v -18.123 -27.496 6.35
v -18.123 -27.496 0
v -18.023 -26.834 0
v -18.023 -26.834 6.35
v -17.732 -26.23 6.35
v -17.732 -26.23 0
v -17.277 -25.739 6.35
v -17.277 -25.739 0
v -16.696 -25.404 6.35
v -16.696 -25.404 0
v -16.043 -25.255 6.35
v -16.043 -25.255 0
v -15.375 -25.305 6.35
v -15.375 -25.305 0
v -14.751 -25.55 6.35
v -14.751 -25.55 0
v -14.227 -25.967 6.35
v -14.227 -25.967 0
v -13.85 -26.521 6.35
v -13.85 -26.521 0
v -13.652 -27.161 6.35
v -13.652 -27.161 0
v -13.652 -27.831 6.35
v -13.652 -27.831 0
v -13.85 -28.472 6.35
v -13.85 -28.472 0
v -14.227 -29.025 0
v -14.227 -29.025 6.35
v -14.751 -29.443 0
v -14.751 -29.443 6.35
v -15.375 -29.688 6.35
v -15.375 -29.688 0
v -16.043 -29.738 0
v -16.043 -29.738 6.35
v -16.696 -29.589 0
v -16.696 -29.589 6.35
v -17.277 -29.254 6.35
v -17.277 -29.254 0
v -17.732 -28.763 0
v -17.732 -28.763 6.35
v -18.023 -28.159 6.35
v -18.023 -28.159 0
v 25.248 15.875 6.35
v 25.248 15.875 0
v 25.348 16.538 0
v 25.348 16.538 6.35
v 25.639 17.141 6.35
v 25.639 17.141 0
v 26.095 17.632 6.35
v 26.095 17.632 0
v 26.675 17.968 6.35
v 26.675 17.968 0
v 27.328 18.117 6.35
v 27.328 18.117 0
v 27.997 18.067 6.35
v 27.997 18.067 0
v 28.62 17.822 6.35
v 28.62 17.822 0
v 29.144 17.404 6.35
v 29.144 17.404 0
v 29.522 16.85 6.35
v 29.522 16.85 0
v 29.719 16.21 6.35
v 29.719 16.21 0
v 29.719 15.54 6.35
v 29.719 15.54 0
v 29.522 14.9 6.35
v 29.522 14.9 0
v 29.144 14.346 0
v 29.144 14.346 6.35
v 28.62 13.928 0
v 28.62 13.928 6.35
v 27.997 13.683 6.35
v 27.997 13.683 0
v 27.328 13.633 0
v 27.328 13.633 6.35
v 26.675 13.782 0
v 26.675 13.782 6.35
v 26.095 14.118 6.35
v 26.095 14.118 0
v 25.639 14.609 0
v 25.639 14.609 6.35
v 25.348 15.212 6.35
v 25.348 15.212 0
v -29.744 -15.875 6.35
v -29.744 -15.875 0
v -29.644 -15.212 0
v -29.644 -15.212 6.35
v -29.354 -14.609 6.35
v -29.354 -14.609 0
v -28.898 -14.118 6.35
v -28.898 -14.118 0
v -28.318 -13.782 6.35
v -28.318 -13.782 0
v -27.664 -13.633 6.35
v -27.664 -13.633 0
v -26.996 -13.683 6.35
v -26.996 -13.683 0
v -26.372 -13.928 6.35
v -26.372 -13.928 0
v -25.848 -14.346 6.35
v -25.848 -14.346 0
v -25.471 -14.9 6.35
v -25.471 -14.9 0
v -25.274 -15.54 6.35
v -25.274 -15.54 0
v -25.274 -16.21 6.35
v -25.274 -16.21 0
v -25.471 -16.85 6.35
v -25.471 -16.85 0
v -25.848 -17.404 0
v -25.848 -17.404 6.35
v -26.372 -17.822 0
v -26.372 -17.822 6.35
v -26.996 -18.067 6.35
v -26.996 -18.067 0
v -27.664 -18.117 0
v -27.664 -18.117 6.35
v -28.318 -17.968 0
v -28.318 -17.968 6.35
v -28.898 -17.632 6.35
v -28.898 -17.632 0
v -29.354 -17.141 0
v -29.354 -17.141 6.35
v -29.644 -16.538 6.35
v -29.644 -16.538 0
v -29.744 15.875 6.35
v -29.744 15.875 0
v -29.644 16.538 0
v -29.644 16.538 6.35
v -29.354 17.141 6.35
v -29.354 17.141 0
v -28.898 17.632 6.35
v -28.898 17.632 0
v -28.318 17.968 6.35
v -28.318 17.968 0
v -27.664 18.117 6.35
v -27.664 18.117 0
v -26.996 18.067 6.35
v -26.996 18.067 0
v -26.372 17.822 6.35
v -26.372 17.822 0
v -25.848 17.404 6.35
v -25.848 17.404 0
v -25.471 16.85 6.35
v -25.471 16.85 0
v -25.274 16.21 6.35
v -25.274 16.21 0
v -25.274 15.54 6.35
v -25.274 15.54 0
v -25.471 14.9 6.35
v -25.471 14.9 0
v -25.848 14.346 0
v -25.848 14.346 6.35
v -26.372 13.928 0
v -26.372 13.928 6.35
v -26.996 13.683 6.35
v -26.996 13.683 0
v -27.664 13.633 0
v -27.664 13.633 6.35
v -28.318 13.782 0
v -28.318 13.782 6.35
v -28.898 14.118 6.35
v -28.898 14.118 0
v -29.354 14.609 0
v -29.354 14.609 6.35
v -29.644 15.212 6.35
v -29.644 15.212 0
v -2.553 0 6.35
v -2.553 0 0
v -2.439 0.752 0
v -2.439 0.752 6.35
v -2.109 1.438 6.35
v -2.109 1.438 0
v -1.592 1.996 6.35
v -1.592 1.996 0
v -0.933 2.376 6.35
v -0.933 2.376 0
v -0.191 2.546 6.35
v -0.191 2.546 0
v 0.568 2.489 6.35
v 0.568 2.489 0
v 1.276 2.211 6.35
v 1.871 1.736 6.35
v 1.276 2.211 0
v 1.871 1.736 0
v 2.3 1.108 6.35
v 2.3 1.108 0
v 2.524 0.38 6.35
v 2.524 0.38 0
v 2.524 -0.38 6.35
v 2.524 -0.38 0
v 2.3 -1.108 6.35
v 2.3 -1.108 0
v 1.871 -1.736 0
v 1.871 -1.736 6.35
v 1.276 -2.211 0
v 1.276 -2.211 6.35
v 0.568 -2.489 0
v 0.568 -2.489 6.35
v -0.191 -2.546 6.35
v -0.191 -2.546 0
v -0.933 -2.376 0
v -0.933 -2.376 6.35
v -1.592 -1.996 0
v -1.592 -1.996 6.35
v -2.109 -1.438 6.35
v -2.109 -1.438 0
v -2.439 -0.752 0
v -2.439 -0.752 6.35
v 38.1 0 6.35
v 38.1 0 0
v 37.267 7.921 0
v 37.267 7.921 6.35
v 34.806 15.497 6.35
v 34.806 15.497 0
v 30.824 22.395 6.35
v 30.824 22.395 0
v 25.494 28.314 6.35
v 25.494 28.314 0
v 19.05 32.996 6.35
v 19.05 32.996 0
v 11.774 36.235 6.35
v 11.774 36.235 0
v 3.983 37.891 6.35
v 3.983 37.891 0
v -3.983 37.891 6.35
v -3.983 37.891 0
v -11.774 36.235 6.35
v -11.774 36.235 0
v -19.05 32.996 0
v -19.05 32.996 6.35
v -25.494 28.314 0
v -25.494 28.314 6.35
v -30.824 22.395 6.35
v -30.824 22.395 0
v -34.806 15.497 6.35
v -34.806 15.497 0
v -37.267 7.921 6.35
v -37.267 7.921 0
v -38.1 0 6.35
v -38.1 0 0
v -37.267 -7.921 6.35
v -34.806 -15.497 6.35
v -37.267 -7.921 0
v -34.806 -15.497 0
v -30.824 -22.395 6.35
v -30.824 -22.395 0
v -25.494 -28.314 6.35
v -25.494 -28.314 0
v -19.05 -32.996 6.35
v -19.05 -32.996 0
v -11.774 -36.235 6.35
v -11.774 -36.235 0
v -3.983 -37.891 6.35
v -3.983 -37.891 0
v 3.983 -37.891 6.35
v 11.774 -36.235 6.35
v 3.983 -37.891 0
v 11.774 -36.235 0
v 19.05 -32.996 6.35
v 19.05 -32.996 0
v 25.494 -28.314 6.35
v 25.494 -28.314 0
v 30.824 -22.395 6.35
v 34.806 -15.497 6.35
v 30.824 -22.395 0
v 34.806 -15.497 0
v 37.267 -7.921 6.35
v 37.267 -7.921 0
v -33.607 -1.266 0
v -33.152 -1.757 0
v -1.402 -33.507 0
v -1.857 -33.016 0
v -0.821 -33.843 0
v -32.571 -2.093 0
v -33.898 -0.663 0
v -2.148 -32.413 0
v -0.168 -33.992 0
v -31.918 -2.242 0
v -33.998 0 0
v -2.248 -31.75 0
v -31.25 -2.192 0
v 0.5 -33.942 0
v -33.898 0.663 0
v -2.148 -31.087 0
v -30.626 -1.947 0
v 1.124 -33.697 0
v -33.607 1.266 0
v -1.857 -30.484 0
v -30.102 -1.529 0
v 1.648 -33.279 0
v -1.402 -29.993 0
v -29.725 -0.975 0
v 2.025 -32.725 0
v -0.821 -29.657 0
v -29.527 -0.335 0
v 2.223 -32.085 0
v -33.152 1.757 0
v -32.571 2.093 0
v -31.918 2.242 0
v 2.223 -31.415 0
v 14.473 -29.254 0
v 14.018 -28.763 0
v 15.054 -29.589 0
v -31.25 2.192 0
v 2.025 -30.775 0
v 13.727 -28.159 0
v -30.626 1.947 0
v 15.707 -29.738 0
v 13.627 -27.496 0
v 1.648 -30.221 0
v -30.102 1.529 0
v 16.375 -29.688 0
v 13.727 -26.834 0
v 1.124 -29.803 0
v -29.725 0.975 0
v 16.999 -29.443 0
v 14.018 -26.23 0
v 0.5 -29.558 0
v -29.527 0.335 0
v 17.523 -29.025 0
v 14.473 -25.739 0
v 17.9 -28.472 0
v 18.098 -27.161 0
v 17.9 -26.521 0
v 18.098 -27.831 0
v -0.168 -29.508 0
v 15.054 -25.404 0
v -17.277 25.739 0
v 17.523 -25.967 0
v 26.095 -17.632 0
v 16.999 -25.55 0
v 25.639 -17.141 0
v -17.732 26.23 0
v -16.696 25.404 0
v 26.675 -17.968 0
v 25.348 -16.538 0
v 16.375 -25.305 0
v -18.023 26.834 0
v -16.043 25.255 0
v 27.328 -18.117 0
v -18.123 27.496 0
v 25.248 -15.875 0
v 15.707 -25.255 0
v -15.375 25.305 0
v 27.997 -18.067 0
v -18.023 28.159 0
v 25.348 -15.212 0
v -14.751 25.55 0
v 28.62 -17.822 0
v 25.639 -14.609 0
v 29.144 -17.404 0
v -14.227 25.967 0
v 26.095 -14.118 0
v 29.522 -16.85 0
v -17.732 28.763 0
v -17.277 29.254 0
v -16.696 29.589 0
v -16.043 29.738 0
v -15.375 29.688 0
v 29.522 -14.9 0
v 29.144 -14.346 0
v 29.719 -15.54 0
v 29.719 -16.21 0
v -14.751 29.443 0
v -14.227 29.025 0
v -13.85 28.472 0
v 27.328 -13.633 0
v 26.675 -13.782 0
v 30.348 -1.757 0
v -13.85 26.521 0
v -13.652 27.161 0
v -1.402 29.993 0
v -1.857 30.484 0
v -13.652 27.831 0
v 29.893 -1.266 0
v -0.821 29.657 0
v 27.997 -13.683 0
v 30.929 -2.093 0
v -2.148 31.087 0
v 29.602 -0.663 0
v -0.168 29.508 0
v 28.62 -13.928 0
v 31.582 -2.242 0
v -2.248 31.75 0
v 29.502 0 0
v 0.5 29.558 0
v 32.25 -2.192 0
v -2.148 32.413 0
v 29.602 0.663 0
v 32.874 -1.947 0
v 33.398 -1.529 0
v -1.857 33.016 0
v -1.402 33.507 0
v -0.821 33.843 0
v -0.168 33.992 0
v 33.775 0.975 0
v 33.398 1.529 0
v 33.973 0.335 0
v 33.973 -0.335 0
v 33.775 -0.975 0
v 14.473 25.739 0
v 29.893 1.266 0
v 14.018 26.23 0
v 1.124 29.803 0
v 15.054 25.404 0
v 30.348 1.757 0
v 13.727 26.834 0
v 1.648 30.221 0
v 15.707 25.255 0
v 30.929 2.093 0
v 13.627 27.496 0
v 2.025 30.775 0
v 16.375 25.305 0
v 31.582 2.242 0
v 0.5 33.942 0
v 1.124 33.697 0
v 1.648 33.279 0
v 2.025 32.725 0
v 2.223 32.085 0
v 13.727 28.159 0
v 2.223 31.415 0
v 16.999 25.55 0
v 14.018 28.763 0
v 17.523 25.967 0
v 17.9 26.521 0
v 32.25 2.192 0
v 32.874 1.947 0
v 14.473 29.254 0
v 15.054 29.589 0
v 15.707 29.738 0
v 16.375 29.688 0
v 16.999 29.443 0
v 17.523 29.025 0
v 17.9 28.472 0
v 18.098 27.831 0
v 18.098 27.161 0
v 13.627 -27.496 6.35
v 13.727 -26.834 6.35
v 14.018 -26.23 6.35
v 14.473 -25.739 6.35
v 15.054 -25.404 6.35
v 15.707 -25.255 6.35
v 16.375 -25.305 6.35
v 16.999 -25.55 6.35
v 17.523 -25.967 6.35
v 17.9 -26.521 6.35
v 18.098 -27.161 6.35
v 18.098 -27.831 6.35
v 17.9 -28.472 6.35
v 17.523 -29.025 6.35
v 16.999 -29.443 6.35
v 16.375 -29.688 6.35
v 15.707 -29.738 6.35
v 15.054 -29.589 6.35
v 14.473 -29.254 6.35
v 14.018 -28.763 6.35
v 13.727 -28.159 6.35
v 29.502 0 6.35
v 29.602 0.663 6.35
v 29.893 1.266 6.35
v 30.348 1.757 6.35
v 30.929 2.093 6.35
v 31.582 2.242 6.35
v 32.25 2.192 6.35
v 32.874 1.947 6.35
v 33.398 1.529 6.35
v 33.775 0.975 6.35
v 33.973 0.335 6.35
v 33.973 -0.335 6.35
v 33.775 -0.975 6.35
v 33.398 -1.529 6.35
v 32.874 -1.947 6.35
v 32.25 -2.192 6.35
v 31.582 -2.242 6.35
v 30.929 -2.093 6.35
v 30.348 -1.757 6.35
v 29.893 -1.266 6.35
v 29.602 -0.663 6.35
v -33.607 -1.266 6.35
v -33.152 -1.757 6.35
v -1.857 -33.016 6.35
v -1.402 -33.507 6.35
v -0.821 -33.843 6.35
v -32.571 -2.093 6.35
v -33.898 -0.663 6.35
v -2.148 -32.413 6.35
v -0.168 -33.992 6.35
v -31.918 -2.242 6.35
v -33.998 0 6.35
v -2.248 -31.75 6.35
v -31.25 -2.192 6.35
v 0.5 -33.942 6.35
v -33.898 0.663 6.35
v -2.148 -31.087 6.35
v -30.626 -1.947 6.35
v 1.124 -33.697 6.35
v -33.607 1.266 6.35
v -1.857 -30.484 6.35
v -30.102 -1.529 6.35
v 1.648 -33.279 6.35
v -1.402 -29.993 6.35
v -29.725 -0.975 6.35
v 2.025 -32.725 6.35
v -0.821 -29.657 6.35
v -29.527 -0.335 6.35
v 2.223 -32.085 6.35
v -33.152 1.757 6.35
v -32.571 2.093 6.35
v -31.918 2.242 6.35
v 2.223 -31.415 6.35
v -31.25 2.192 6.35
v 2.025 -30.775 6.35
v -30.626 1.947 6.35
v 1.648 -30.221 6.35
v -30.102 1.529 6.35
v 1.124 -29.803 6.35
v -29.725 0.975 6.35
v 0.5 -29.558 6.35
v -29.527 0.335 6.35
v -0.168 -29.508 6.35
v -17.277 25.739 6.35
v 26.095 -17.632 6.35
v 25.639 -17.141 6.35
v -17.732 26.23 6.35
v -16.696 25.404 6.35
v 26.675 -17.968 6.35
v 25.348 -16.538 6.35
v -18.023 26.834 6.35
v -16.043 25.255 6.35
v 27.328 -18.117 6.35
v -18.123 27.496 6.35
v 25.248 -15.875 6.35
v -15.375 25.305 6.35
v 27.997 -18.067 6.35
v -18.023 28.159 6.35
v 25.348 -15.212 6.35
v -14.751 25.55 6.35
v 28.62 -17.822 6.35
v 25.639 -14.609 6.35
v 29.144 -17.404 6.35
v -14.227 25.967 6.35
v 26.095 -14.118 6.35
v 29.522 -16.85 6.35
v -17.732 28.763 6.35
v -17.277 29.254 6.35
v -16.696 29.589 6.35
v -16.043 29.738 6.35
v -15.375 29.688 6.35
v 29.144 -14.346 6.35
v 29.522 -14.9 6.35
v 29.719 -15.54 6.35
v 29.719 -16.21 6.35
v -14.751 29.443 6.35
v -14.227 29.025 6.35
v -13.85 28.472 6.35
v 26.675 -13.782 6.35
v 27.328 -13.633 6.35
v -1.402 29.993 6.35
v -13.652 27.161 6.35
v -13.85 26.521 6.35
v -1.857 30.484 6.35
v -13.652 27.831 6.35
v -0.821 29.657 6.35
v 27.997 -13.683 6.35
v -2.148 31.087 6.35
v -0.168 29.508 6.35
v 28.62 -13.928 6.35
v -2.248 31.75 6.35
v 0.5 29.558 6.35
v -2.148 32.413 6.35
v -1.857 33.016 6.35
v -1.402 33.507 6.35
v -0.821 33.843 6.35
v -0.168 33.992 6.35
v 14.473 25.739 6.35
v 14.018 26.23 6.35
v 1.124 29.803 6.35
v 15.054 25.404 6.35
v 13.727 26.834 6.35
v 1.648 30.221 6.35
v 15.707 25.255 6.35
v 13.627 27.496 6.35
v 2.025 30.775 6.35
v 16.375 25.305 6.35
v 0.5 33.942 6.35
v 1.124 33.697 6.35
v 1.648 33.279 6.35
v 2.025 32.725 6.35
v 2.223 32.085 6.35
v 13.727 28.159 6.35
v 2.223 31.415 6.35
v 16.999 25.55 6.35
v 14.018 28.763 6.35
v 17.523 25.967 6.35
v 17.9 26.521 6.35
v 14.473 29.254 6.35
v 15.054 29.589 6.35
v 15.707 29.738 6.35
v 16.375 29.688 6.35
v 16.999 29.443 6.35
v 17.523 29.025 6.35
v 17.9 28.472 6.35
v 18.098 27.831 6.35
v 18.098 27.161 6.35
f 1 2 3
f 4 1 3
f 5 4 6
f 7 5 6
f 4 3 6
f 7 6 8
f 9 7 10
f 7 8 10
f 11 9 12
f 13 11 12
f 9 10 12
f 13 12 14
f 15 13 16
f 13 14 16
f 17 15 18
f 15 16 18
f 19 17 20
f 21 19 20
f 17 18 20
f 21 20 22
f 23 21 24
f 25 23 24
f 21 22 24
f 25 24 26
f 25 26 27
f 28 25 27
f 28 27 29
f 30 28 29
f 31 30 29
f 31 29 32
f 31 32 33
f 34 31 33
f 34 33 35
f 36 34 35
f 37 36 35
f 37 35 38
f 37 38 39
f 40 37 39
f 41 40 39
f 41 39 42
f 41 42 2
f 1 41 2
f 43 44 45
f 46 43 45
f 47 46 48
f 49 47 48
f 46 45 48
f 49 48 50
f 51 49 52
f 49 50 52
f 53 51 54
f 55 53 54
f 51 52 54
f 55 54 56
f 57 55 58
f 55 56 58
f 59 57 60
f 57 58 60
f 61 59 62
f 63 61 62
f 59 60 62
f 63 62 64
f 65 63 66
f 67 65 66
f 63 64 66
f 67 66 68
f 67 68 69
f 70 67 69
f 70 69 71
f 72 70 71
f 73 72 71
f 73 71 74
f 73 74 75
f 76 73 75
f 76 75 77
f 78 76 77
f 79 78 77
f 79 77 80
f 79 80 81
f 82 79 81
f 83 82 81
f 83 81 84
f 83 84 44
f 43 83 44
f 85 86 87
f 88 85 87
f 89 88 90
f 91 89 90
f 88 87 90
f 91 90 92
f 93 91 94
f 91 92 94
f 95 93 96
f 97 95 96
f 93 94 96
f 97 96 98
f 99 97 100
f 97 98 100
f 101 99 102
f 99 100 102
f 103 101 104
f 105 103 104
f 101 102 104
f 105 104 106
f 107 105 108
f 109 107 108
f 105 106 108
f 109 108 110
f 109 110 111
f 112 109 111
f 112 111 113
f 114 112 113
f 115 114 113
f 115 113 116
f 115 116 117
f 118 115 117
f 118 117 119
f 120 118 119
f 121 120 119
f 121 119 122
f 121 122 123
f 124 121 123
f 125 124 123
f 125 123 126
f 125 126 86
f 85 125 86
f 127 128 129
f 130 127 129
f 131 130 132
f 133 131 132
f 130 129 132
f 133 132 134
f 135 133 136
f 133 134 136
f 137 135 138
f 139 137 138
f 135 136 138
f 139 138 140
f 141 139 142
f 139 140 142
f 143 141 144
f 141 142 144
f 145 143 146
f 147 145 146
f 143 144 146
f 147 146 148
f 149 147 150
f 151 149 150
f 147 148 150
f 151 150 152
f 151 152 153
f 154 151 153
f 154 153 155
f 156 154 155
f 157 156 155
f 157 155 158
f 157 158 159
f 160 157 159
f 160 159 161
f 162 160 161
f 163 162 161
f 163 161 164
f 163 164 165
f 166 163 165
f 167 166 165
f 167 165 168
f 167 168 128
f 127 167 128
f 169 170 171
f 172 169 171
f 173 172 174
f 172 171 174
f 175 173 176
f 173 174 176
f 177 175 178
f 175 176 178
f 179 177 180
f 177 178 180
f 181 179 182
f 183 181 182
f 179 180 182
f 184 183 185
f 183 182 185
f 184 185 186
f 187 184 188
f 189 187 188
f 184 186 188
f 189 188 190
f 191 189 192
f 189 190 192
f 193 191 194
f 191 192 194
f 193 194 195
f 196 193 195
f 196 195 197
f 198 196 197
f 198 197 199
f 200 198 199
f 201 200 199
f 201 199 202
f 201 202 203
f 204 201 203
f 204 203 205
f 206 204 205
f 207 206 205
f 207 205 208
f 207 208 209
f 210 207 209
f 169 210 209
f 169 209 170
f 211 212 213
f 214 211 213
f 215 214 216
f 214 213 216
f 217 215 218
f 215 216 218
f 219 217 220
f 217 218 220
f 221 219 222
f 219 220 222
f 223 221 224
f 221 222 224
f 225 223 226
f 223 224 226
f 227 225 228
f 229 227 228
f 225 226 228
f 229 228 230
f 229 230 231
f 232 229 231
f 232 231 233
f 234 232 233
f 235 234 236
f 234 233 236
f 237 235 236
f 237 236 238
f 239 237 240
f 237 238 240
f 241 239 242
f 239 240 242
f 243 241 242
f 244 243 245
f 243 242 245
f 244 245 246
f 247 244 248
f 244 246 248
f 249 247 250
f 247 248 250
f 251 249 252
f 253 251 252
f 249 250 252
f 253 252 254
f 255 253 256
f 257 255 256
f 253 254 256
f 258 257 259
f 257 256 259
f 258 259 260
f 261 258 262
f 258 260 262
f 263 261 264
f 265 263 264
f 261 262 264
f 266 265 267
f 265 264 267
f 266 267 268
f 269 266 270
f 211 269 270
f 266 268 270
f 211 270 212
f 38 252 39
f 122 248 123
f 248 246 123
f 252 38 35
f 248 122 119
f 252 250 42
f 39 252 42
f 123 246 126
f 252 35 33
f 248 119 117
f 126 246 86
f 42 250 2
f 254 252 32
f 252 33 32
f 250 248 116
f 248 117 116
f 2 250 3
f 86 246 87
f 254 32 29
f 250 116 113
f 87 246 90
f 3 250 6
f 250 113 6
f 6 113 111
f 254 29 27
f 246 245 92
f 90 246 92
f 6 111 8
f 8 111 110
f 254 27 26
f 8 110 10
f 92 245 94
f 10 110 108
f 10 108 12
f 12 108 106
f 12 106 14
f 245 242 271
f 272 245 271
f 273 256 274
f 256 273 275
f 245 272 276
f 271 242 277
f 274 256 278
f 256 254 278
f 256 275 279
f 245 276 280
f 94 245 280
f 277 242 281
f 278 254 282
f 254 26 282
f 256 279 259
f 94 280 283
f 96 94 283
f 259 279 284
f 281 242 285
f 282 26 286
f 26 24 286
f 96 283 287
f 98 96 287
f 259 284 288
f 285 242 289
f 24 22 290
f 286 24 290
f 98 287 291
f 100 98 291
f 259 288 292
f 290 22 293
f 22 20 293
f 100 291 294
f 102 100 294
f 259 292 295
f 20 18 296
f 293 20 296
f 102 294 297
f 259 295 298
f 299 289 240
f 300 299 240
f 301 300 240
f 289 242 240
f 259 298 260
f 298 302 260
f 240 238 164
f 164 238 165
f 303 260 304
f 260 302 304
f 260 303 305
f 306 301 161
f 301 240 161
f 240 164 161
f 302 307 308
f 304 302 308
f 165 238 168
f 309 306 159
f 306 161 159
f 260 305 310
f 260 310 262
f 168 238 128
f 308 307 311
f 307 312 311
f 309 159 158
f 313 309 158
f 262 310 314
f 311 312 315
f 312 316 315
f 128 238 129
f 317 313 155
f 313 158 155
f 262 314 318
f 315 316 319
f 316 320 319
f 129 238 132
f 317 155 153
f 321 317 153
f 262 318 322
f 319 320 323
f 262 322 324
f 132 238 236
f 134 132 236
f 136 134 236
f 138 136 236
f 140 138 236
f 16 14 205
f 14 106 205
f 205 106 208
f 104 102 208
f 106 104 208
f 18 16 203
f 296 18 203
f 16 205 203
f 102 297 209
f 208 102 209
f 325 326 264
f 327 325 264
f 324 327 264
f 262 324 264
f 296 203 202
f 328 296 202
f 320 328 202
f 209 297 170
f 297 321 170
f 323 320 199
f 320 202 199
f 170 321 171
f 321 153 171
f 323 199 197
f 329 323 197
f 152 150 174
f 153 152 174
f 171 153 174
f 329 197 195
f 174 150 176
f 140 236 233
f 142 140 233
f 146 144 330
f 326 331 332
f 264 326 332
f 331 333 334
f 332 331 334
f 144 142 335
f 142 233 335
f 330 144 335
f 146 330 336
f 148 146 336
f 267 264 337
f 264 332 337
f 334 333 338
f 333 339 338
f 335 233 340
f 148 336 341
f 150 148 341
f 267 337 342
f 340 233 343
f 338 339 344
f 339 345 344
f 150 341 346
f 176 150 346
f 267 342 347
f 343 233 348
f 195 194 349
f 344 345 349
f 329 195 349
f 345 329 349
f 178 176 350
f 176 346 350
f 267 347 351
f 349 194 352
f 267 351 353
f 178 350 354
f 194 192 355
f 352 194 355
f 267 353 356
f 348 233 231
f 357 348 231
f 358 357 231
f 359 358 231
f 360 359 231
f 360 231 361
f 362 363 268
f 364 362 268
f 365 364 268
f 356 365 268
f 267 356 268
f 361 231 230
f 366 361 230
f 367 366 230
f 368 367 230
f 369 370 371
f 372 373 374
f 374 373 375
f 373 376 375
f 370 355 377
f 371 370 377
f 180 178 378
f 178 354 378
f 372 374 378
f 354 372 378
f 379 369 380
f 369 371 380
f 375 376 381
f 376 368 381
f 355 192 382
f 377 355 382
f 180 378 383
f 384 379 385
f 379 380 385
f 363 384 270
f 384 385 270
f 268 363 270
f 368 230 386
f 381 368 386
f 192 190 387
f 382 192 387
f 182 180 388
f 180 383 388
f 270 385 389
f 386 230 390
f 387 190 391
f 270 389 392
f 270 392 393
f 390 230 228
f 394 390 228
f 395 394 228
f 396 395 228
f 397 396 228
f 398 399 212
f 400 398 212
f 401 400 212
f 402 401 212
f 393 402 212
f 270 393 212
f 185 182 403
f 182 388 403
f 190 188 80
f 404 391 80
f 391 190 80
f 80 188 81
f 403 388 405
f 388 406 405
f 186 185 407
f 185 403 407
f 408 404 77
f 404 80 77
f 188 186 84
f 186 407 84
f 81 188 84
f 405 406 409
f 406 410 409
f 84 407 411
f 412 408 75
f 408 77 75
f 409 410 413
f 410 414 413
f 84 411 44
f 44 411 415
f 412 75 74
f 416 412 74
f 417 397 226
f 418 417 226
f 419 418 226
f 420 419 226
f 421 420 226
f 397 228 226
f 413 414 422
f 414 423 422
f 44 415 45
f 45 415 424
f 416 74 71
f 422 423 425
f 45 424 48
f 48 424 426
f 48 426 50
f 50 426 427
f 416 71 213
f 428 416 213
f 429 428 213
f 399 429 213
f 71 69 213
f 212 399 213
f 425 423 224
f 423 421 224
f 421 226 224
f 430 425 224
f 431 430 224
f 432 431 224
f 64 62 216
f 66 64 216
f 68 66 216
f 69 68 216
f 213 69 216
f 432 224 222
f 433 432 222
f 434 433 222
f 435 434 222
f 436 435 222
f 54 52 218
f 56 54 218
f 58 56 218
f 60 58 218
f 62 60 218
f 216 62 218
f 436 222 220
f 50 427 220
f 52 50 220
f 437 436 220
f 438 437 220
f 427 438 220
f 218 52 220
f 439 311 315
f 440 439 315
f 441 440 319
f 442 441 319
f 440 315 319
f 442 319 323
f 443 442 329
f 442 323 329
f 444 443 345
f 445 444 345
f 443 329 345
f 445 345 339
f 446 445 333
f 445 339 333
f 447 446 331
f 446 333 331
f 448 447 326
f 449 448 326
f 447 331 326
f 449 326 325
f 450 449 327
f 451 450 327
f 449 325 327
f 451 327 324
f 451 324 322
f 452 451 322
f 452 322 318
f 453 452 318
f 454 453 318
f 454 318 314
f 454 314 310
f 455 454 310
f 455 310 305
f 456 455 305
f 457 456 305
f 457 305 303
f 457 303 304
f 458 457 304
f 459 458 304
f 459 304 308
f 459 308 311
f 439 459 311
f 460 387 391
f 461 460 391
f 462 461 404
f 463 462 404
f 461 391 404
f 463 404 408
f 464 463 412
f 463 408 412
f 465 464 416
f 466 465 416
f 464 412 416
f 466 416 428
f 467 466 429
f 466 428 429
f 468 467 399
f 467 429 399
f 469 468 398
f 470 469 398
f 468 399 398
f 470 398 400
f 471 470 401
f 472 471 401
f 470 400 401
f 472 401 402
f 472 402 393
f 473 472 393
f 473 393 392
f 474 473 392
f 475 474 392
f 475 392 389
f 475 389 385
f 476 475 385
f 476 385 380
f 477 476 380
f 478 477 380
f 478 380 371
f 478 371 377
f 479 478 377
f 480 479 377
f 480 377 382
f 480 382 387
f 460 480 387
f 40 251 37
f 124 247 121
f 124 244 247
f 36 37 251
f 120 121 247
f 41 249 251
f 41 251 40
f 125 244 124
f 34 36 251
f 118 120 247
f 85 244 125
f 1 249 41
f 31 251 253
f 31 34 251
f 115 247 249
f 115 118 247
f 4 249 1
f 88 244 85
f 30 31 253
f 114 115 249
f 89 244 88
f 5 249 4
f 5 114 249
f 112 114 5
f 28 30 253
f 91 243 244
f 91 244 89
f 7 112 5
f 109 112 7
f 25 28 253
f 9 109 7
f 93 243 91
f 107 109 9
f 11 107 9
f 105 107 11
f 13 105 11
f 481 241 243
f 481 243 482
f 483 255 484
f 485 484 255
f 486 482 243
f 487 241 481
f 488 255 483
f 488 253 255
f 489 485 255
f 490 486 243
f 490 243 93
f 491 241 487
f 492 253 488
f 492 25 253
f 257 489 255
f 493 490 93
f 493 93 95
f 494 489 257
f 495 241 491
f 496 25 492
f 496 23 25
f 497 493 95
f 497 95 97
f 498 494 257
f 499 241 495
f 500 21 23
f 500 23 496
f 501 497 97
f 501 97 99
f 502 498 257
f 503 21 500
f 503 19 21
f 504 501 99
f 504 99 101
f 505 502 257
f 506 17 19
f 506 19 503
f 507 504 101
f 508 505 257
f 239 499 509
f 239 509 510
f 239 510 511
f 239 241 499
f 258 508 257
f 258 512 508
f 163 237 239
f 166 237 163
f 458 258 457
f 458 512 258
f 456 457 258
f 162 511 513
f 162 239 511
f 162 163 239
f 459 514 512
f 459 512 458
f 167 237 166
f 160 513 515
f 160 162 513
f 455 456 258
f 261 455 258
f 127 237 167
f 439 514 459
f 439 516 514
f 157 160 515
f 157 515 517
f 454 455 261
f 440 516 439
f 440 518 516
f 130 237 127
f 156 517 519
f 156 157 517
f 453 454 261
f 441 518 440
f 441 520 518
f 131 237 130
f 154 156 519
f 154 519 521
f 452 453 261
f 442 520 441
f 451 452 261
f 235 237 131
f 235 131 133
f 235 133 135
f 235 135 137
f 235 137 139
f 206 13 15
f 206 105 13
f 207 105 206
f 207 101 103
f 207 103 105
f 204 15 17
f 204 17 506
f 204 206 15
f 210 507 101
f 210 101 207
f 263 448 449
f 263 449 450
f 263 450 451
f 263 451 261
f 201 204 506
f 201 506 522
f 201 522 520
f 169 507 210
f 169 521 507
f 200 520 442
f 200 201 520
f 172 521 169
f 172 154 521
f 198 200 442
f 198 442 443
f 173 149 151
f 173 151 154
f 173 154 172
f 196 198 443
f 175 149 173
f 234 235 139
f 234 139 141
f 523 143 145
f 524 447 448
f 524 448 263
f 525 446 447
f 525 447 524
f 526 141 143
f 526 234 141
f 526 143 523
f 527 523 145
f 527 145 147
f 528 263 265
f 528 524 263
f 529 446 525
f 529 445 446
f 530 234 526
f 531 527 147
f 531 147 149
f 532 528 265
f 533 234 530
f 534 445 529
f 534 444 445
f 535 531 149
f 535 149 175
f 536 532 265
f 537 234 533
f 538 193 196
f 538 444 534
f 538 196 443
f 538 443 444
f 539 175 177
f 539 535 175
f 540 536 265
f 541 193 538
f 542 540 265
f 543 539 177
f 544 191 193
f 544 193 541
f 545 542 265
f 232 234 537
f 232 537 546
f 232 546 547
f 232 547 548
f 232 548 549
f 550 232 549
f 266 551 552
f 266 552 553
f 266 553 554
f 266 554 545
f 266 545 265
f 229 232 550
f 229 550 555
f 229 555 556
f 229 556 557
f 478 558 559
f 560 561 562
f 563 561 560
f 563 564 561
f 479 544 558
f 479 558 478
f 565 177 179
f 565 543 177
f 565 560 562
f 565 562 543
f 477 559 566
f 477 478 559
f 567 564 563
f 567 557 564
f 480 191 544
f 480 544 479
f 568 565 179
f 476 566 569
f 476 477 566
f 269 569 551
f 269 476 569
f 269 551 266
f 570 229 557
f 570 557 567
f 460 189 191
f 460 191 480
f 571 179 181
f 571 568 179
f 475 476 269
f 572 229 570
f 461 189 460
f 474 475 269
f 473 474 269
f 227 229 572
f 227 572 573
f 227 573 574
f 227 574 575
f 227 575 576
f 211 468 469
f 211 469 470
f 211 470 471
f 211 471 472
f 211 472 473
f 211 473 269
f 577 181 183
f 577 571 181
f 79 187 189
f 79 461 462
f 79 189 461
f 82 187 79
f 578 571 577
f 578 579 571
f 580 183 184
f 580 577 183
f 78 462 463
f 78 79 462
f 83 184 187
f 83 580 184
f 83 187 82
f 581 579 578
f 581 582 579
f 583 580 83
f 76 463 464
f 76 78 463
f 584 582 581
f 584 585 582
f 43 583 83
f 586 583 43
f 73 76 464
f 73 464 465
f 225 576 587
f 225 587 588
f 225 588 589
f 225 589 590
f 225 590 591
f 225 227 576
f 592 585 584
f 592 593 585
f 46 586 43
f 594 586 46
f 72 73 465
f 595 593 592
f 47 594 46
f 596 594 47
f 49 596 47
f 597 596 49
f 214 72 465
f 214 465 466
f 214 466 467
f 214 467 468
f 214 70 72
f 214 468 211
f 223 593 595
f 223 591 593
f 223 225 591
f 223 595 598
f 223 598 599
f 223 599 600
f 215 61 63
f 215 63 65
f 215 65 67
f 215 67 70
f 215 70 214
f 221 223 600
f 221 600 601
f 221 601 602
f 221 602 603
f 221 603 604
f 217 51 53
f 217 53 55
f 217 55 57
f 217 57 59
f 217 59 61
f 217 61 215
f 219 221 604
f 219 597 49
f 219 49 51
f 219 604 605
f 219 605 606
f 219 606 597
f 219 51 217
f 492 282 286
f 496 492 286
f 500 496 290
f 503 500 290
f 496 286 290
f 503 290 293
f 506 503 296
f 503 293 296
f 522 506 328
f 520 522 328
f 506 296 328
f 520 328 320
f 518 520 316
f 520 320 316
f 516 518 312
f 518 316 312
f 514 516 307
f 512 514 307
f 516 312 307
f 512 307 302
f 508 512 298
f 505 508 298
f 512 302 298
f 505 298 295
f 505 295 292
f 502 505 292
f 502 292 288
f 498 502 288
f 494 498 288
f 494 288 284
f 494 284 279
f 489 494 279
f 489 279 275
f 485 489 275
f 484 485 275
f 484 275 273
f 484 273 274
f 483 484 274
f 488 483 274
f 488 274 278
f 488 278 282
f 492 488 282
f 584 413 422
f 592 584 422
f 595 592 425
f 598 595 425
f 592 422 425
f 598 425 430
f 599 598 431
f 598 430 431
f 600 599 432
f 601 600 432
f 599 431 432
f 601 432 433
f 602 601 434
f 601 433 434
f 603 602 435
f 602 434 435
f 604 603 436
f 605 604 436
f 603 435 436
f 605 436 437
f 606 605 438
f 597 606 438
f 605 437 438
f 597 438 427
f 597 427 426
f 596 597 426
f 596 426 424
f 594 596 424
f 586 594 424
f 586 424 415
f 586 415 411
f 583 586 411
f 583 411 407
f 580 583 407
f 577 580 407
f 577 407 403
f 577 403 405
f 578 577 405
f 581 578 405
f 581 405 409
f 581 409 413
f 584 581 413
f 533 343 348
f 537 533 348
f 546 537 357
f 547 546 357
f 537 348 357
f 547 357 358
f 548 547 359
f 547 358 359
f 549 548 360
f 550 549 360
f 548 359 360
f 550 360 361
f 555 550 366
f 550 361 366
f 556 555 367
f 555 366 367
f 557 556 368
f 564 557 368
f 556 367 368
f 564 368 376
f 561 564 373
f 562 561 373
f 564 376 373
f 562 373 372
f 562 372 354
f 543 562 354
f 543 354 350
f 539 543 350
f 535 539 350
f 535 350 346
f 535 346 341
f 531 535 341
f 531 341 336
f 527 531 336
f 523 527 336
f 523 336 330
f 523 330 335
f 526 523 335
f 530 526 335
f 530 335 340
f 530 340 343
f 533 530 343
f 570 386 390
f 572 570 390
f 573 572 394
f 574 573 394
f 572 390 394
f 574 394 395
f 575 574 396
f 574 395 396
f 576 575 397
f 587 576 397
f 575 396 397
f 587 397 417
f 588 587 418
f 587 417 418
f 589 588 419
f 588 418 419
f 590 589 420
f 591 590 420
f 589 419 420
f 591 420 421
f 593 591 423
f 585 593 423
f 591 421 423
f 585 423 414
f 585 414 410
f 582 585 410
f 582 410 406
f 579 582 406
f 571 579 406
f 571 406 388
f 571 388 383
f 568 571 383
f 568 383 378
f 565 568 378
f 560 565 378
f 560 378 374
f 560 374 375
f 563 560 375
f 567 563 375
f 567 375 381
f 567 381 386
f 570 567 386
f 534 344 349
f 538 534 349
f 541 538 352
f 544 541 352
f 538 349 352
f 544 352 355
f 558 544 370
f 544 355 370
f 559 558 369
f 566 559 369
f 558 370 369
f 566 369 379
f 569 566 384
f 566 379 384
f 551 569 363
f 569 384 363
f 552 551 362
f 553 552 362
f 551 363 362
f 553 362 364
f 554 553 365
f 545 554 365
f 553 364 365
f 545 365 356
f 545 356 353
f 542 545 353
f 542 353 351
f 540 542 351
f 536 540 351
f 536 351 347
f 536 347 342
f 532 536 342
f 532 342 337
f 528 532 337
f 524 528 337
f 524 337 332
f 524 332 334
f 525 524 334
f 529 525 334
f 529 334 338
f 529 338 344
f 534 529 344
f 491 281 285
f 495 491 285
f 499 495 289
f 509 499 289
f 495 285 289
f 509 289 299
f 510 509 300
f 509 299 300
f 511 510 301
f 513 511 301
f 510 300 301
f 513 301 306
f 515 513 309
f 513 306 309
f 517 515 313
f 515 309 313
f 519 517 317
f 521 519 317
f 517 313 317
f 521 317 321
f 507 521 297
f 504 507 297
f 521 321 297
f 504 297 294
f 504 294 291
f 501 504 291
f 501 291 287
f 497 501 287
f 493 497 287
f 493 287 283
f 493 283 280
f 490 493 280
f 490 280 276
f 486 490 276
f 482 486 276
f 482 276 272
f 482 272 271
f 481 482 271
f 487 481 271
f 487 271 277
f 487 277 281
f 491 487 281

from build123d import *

# Parameters (mm, degrees)
SKETCH1_R                 = 38.1
BOSS_EXTRUDE1_DEPTH       = 6.35
F_1_4_20_TAPPED_HOLE1_D   = 5.1054
F_8_CLEARANCE_HOLE1_D     = 4.4958
F_8_CLEARANCE_HOLE1_DEPTH = 313.436
F_8_CLEARANCE_HOLE1_TIP   = 1.350674586


with BuildPart() as part:
    # Sketch1 → Boss-Extrude1 (new body)
    with BuildSketch(Plane.XY):
        Circle(SKETCH1_R)
    extrude(amount=BOSS_EXTRUDE1_DEPTH)

    # 1/4-20 Tapped Hole1 (through all)
    with Locations(Plane.XY.offset(6.35)):
        with Locations((0, 0)):
            Hole(F_1_4_20_TAPPED_HOLE1_D / 2)

    # #8 Clearance Hole1
    with Locations(Plane.XY.offset(6.35)):
        with Locations((-31.75, 0), (-27.49630657, 15.875), (-15.875, 27.49630657), (0, 31.75), (15.875, 27.49630657), (27.49630657, 15.875), (31.75, 0), (27.49630657, -15.875), (15.875, -27.49630657), (0, -31.75), (-15.875, -27.49630657), (-27.49630657, -15.875)):
            Hole(F_8_CLEARANCE_HOLE1_D / 2, depth=F_8_CLEARANCE_HOLE1_DEPTH)
            with Locations((0, 0, -(F_8_CLEARANCE_HOLE1_DEPTH + F_8_CLEARANCE_HOLE1_TIP / 2))):  # 118° drill point
                Cone(0, F_8_CLEARANCE_HOLE1_D / 2, F_8_CLEARANCE_HOLE1_TIP, mode=Mode.SUBTRACT)


solid = part.part
